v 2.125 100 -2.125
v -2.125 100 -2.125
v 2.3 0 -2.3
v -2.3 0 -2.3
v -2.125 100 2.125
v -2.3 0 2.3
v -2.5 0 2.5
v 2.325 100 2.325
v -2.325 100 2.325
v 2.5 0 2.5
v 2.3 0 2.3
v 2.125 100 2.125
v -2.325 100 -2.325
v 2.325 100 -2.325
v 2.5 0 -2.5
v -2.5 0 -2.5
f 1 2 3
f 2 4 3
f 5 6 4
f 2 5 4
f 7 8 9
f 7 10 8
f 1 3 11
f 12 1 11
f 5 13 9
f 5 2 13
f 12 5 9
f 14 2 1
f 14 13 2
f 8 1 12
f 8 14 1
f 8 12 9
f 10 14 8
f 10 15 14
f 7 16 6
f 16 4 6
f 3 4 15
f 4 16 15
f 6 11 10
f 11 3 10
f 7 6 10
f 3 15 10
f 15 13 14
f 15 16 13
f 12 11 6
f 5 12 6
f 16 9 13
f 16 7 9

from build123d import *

# Parameters (mm, degrees)
SHELL_1_T = -0.2


with BuildPart() as part:
    # 草图2 → 放样1 section 0
    with BuildSketch(Plane(origin=(0, 100, 0), x_dir=(1, 0, 0), z_dir=(0, 1, 0))):
        with BuildLine():
            Line((-2.325466898, 2.325466898), (2.325466898, 2.325466898))
            Line((2.325466898, 2.325466898), (2.325466898, -2.325466898))
            Line((2.325466898, -2.325466898), (-2.325466898, -2.325466898))
            Line((-2.325466898, -2.325466898), (-2.325466898, 2.325466898))
        make_face()
    # 草图1 → 放样1 section 1
    with BuildSketch(Plane(origin=(0, 0, 0), x_dir=(1, 0, 0), z_dir=(0, 1, 0))):
        with BuildLine():
            Line((-2.5, 2.5), (2.5, 2.5))
            Line((2.5, 2.5), (2.5, -2.5))
            Line((2.5, -2.5), (-2.5, -2.5))
            Line((-2.5, -2.5), (-2.5, 2.5))
        make_face()
    loft()

    # 抽壳1
    shell_1_openings = [part.faces().sort_by_distance(p)[0] for p in [
        (0, 0, 0),
        (0, 100, 0),
    ]]
    offset(amount=SHELL_1_T, openings=shell_1_openings, kind=Kind.INTERSECTION)


solid = part.part
